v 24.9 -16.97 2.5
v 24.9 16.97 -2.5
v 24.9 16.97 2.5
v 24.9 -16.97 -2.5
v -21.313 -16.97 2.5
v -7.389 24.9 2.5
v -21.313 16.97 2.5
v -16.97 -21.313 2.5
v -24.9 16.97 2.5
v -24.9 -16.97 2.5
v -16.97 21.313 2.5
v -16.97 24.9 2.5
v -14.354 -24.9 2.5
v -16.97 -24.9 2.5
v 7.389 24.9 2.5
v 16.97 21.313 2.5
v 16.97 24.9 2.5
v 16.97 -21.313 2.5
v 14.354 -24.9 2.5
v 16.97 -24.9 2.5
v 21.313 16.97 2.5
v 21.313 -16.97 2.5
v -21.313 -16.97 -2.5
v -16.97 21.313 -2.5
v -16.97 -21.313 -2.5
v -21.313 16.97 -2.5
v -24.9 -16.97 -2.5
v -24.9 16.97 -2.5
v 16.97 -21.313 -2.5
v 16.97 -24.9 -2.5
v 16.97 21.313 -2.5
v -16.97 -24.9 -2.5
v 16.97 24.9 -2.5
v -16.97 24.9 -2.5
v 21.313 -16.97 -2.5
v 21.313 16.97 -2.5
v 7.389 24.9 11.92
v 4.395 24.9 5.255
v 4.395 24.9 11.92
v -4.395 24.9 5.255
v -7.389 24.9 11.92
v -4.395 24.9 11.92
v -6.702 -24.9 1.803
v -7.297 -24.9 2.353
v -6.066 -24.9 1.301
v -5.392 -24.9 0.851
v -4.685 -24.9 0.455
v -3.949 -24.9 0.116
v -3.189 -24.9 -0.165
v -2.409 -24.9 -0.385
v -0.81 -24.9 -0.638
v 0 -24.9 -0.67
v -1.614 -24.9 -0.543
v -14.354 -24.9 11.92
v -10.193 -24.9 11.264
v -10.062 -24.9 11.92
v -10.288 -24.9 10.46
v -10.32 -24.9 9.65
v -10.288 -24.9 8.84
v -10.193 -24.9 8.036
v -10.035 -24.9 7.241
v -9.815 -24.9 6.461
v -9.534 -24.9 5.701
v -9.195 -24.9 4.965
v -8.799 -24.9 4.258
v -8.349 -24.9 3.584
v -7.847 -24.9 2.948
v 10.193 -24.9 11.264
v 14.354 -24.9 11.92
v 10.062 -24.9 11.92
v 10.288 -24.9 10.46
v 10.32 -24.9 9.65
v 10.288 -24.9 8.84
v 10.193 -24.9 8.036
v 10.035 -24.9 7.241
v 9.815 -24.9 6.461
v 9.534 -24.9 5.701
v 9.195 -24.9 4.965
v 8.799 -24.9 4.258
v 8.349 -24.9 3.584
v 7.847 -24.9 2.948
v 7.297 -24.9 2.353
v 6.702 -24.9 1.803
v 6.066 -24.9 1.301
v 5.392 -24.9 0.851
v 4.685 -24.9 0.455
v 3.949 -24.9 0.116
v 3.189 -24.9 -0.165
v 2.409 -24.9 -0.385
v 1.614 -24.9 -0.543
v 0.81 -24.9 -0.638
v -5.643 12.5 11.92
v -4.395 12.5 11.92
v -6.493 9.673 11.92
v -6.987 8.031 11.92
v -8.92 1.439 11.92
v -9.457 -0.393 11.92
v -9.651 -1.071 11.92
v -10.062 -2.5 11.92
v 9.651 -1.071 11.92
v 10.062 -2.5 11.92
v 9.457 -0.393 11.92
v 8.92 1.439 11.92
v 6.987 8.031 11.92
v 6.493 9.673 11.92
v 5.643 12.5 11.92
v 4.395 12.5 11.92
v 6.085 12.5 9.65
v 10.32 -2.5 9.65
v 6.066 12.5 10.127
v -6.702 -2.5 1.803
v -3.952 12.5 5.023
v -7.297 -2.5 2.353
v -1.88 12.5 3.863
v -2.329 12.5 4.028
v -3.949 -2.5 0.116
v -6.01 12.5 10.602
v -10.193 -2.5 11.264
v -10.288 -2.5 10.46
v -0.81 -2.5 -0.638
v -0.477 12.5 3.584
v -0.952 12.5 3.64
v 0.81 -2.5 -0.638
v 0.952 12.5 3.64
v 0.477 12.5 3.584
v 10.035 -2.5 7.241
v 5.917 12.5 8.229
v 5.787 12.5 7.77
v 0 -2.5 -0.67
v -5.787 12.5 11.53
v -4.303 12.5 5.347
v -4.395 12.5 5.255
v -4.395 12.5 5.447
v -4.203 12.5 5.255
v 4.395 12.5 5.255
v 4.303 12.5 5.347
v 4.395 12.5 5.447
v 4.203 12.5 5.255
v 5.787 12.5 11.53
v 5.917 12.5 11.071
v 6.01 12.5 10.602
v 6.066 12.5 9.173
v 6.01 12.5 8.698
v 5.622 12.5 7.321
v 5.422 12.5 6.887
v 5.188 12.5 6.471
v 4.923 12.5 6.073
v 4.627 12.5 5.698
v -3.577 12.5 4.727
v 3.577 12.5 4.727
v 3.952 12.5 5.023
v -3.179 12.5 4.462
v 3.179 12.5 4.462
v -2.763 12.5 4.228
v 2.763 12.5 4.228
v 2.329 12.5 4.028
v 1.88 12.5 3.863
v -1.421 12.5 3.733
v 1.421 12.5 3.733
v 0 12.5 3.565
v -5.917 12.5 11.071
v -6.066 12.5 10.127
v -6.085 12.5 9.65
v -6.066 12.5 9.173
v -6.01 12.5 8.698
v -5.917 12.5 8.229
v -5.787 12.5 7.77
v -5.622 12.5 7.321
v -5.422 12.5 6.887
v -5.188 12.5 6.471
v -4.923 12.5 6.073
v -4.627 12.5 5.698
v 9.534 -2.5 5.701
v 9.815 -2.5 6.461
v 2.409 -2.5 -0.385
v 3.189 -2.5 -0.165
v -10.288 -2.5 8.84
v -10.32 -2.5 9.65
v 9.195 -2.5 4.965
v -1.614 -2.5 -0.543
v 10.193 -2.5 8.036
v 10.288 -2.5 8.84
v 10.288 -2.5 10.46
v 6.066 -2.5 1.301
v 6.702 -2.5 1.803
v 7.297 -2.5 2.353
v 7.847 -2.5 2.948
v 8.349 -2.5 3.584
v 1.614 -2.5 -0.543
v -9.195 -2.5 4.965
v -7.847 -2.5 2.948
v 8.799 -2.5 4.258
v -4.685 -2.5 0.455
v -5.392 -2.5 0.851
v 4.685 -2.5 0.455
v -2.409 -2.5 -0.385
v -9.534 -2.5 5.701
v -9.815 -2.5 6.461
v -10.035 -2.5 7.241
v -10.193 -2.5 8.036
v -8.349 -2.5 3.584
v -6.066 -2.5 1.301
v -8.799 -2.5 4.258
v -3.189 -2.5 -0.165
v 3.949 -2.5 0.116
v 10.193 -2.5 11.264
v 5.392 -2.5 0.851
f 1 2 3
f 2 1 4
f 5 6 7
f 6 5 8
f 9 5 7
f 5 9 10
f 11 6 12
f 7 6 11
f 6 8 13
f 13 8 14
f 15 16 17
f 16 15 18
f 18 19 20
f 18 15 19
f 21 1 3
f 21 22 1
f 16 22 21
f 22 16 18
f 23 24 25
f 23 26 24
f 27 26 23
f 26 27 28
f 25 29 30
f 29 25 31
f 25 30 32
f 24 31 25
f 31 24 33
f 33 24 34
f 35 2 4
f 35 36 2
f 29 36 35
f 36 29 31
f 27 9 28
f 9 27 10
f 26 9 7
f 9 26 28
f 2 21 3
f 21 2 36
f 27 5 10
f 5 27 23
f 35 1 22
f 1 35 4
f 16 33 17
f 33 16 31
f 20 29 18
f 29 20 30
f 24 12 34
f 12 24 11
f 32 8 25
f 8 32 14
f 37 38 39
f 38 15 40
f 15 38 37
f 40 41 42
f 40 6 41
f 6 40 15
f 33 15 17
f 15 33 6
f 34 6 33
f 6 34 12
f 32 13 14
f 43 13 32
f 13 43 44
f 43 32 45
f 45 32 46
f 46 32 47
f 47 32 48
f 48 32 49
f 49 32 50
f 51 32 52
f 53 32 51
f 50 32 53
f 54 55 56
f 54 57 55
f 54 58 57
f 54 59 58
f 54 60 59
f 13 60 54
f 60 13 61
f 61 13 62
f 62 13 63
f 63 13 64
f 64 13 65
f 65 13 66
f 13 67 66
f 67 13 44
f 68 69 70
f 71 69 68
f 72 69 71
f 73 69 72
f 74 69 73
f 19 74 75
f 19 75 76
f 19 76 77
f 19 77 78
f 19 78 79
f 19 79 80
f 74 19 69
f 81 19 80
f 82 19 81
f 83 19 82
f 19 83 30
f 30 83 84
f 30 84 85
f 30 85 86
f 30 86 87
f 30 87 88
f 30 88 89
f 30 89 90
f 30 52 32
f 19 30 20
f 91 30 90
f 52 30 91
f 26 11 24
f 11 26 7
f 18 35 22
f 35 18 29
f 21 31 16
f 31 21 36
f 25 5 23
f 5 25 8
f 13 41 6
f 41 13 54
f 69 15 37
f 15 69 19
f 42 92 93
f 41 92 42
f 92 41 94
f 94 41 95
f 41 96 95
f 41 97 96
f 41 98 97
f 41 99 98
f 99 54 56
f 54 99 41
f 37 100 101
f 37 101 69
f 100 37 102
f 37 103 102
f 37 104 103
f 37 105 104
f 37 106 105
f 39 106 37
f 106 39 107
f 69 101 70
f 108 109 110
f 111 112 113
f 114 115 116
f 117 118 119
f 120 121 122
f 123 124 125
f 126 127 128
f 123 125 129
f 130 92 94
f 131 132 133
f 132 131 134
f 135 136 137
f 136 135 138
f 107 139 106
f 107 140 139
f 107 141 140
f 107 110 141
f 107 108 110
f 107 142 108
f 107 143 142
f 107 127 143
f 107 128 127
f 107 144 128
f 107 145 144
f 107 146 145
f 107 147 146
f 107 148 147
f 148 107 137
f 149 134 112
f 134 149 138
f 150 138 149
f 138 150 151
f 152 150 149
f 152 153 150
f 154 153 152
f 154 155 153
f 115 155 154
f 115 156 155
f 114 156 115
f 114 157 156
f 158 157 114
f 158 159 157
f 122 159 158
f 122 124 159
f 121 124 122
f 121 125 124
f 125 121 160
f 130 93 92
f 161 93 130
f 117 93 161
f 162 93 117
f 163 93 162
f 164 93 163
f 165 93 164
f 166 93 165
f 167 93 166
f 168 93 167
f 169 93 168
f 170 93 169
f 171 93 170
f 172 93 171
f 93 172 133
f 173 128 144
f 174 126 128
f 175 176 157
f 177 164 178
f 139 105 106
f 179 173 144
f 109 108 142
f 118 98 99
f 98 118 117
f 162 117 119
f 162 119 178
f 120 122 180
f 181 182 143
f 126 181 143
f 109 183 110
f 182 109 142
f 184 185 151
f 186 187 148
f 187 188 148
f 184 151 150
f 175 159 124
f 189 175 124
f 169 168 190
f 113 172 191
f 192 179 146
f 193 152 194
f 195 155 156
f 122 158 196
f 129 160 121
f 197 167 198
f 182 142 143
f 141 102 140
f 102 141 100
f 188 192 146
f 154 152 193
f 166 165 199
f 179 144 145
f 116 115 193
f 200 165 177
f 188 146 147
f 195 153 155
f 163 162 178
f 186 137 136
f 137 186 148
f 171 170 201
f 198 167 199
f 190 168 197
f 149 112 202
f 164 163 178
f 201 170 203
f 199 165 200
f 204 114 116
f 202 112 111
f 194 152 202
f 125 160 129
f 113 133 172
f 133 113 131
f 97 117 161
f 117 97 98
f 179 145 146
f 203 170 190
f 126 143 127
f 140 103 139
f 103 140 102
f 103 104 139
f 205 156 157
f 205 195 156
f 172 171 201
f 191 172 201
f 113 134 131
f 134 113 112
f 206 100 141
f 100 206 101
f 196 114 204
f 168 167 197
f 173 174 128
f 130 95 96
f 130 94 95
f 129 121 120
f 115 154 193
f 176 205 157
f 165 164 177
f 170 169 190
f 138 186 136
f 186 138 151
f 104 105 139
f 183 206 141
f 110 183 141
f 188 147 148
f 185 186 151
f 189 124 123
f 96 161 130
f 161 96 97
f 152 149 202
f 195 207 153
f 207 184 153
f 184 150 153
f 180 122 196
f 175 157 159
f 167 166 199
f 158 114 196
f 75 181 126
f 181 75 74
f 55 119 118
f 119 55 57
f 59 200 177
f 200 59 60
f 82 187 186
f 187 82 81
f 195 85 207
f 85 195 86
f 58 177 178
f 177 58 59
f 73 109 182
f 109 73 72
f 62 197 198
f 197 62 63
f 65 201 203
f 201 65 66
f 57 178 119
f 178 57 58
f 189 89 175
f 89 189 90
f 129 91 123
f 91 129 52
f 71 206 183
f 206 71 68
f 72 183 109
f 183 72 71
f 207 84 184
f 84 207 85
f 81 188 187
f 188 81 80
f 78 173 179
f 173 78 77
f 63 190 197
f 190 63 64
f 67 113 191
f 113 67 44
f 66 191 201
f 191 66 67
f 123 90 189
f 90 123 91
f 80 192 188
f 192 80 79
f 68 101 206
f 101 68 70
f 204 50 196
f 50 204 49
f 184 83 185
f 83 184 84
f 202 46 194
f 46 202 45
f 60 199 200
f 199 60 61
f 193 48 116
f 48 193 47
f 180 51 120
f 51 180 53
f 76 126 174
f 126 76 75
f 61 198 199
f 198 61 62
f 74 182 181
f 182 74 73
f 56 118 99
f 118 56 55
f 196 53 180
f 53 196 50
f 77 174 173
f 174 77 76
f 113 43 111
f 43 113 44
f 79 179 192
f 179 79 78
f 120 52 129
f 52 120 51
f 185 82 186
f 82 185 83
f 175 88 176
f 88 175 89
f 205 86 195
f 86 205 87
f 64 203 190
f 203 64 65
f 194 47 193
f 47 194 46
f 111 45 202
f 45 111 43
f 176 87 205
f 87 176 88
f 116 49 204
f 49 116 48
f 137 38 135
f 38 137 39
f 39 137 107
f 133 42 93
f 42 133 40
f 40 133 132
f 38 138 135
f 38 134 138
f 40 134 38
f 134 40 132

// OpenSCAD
// IN PROGRESS
//Cube insert: beam expander


/* [Hiden] */
$fn = 80;
eps = .002;
a = 49.8;
b = 33.6;
c = 6.28;
d = 53.8;
h = 5;
IM_offset = 0.17;

1st_lens_w = 8.45;   // phone lens side size
1st_lens_h = 20;

2nd_lens_d = 20.3;  // objective lens diameter
2nd_lens_h = 30;

lens_l = 15;


module Insert() {
    union() {   //basic insert design
            cube([a,b+2*IM_offset,h], center=true);
            cube([b+2*IM_offset,a,h], center=true);
            rotate(a=[0,0,45]){
                cube([c,d+2*IM_offset,h], center=true);
            }
            rotate(a=[0,0,-45]){
                cube([c,d+2*IM_offset,h], center=true);
            }
        }
}

module LensTube() {
    translate([0,5,2nd_lens_d/2-(h/2-2)]) // 2nd_lens_d/2
    rotate([90,0,0])
    union() {
        cylinder(h=lens_l,
                 d1=1st_lens_w*1.4 + 2*IM_offset,
                 d2=2nd_lens_d + 2*IM_offset, center=true);
        
        translate([0,0,
                   lens_l/2+2nd_lens_h*2])
        cylinder(h=2nd_lens_h*4,
                 d=2nd_lens_d + 2*IM_offset, center=true);
        
        translate([0,0,
                   -(lens_l/2+1st_lens_h*2)])
        cube([1st_lens_w + 2*IM_offset,
              1st_lens_w + 2*IM_offset,
              1st_lens_h*4],
              center=true);
    }
}

module ExpanderInsert() {
    difference() {
        union(){
            Insert();
            translate([0,0,5])
            rotate([-90,45,0])
            difference() {
                cylinder(a,2nd_lens_d,1st_lens_w+2,
                         $fn=4,center=true);
                
                translate([0,25,0])
                rotate([0,0,45])
                cube([30,100,a], center=true);

                translate([0,-31,0])
                rotate([0,0,45])                
                cube([30,100,a], center=true);
            }
        }
        LensTube();
    }  
}


ExpanderInsert();
